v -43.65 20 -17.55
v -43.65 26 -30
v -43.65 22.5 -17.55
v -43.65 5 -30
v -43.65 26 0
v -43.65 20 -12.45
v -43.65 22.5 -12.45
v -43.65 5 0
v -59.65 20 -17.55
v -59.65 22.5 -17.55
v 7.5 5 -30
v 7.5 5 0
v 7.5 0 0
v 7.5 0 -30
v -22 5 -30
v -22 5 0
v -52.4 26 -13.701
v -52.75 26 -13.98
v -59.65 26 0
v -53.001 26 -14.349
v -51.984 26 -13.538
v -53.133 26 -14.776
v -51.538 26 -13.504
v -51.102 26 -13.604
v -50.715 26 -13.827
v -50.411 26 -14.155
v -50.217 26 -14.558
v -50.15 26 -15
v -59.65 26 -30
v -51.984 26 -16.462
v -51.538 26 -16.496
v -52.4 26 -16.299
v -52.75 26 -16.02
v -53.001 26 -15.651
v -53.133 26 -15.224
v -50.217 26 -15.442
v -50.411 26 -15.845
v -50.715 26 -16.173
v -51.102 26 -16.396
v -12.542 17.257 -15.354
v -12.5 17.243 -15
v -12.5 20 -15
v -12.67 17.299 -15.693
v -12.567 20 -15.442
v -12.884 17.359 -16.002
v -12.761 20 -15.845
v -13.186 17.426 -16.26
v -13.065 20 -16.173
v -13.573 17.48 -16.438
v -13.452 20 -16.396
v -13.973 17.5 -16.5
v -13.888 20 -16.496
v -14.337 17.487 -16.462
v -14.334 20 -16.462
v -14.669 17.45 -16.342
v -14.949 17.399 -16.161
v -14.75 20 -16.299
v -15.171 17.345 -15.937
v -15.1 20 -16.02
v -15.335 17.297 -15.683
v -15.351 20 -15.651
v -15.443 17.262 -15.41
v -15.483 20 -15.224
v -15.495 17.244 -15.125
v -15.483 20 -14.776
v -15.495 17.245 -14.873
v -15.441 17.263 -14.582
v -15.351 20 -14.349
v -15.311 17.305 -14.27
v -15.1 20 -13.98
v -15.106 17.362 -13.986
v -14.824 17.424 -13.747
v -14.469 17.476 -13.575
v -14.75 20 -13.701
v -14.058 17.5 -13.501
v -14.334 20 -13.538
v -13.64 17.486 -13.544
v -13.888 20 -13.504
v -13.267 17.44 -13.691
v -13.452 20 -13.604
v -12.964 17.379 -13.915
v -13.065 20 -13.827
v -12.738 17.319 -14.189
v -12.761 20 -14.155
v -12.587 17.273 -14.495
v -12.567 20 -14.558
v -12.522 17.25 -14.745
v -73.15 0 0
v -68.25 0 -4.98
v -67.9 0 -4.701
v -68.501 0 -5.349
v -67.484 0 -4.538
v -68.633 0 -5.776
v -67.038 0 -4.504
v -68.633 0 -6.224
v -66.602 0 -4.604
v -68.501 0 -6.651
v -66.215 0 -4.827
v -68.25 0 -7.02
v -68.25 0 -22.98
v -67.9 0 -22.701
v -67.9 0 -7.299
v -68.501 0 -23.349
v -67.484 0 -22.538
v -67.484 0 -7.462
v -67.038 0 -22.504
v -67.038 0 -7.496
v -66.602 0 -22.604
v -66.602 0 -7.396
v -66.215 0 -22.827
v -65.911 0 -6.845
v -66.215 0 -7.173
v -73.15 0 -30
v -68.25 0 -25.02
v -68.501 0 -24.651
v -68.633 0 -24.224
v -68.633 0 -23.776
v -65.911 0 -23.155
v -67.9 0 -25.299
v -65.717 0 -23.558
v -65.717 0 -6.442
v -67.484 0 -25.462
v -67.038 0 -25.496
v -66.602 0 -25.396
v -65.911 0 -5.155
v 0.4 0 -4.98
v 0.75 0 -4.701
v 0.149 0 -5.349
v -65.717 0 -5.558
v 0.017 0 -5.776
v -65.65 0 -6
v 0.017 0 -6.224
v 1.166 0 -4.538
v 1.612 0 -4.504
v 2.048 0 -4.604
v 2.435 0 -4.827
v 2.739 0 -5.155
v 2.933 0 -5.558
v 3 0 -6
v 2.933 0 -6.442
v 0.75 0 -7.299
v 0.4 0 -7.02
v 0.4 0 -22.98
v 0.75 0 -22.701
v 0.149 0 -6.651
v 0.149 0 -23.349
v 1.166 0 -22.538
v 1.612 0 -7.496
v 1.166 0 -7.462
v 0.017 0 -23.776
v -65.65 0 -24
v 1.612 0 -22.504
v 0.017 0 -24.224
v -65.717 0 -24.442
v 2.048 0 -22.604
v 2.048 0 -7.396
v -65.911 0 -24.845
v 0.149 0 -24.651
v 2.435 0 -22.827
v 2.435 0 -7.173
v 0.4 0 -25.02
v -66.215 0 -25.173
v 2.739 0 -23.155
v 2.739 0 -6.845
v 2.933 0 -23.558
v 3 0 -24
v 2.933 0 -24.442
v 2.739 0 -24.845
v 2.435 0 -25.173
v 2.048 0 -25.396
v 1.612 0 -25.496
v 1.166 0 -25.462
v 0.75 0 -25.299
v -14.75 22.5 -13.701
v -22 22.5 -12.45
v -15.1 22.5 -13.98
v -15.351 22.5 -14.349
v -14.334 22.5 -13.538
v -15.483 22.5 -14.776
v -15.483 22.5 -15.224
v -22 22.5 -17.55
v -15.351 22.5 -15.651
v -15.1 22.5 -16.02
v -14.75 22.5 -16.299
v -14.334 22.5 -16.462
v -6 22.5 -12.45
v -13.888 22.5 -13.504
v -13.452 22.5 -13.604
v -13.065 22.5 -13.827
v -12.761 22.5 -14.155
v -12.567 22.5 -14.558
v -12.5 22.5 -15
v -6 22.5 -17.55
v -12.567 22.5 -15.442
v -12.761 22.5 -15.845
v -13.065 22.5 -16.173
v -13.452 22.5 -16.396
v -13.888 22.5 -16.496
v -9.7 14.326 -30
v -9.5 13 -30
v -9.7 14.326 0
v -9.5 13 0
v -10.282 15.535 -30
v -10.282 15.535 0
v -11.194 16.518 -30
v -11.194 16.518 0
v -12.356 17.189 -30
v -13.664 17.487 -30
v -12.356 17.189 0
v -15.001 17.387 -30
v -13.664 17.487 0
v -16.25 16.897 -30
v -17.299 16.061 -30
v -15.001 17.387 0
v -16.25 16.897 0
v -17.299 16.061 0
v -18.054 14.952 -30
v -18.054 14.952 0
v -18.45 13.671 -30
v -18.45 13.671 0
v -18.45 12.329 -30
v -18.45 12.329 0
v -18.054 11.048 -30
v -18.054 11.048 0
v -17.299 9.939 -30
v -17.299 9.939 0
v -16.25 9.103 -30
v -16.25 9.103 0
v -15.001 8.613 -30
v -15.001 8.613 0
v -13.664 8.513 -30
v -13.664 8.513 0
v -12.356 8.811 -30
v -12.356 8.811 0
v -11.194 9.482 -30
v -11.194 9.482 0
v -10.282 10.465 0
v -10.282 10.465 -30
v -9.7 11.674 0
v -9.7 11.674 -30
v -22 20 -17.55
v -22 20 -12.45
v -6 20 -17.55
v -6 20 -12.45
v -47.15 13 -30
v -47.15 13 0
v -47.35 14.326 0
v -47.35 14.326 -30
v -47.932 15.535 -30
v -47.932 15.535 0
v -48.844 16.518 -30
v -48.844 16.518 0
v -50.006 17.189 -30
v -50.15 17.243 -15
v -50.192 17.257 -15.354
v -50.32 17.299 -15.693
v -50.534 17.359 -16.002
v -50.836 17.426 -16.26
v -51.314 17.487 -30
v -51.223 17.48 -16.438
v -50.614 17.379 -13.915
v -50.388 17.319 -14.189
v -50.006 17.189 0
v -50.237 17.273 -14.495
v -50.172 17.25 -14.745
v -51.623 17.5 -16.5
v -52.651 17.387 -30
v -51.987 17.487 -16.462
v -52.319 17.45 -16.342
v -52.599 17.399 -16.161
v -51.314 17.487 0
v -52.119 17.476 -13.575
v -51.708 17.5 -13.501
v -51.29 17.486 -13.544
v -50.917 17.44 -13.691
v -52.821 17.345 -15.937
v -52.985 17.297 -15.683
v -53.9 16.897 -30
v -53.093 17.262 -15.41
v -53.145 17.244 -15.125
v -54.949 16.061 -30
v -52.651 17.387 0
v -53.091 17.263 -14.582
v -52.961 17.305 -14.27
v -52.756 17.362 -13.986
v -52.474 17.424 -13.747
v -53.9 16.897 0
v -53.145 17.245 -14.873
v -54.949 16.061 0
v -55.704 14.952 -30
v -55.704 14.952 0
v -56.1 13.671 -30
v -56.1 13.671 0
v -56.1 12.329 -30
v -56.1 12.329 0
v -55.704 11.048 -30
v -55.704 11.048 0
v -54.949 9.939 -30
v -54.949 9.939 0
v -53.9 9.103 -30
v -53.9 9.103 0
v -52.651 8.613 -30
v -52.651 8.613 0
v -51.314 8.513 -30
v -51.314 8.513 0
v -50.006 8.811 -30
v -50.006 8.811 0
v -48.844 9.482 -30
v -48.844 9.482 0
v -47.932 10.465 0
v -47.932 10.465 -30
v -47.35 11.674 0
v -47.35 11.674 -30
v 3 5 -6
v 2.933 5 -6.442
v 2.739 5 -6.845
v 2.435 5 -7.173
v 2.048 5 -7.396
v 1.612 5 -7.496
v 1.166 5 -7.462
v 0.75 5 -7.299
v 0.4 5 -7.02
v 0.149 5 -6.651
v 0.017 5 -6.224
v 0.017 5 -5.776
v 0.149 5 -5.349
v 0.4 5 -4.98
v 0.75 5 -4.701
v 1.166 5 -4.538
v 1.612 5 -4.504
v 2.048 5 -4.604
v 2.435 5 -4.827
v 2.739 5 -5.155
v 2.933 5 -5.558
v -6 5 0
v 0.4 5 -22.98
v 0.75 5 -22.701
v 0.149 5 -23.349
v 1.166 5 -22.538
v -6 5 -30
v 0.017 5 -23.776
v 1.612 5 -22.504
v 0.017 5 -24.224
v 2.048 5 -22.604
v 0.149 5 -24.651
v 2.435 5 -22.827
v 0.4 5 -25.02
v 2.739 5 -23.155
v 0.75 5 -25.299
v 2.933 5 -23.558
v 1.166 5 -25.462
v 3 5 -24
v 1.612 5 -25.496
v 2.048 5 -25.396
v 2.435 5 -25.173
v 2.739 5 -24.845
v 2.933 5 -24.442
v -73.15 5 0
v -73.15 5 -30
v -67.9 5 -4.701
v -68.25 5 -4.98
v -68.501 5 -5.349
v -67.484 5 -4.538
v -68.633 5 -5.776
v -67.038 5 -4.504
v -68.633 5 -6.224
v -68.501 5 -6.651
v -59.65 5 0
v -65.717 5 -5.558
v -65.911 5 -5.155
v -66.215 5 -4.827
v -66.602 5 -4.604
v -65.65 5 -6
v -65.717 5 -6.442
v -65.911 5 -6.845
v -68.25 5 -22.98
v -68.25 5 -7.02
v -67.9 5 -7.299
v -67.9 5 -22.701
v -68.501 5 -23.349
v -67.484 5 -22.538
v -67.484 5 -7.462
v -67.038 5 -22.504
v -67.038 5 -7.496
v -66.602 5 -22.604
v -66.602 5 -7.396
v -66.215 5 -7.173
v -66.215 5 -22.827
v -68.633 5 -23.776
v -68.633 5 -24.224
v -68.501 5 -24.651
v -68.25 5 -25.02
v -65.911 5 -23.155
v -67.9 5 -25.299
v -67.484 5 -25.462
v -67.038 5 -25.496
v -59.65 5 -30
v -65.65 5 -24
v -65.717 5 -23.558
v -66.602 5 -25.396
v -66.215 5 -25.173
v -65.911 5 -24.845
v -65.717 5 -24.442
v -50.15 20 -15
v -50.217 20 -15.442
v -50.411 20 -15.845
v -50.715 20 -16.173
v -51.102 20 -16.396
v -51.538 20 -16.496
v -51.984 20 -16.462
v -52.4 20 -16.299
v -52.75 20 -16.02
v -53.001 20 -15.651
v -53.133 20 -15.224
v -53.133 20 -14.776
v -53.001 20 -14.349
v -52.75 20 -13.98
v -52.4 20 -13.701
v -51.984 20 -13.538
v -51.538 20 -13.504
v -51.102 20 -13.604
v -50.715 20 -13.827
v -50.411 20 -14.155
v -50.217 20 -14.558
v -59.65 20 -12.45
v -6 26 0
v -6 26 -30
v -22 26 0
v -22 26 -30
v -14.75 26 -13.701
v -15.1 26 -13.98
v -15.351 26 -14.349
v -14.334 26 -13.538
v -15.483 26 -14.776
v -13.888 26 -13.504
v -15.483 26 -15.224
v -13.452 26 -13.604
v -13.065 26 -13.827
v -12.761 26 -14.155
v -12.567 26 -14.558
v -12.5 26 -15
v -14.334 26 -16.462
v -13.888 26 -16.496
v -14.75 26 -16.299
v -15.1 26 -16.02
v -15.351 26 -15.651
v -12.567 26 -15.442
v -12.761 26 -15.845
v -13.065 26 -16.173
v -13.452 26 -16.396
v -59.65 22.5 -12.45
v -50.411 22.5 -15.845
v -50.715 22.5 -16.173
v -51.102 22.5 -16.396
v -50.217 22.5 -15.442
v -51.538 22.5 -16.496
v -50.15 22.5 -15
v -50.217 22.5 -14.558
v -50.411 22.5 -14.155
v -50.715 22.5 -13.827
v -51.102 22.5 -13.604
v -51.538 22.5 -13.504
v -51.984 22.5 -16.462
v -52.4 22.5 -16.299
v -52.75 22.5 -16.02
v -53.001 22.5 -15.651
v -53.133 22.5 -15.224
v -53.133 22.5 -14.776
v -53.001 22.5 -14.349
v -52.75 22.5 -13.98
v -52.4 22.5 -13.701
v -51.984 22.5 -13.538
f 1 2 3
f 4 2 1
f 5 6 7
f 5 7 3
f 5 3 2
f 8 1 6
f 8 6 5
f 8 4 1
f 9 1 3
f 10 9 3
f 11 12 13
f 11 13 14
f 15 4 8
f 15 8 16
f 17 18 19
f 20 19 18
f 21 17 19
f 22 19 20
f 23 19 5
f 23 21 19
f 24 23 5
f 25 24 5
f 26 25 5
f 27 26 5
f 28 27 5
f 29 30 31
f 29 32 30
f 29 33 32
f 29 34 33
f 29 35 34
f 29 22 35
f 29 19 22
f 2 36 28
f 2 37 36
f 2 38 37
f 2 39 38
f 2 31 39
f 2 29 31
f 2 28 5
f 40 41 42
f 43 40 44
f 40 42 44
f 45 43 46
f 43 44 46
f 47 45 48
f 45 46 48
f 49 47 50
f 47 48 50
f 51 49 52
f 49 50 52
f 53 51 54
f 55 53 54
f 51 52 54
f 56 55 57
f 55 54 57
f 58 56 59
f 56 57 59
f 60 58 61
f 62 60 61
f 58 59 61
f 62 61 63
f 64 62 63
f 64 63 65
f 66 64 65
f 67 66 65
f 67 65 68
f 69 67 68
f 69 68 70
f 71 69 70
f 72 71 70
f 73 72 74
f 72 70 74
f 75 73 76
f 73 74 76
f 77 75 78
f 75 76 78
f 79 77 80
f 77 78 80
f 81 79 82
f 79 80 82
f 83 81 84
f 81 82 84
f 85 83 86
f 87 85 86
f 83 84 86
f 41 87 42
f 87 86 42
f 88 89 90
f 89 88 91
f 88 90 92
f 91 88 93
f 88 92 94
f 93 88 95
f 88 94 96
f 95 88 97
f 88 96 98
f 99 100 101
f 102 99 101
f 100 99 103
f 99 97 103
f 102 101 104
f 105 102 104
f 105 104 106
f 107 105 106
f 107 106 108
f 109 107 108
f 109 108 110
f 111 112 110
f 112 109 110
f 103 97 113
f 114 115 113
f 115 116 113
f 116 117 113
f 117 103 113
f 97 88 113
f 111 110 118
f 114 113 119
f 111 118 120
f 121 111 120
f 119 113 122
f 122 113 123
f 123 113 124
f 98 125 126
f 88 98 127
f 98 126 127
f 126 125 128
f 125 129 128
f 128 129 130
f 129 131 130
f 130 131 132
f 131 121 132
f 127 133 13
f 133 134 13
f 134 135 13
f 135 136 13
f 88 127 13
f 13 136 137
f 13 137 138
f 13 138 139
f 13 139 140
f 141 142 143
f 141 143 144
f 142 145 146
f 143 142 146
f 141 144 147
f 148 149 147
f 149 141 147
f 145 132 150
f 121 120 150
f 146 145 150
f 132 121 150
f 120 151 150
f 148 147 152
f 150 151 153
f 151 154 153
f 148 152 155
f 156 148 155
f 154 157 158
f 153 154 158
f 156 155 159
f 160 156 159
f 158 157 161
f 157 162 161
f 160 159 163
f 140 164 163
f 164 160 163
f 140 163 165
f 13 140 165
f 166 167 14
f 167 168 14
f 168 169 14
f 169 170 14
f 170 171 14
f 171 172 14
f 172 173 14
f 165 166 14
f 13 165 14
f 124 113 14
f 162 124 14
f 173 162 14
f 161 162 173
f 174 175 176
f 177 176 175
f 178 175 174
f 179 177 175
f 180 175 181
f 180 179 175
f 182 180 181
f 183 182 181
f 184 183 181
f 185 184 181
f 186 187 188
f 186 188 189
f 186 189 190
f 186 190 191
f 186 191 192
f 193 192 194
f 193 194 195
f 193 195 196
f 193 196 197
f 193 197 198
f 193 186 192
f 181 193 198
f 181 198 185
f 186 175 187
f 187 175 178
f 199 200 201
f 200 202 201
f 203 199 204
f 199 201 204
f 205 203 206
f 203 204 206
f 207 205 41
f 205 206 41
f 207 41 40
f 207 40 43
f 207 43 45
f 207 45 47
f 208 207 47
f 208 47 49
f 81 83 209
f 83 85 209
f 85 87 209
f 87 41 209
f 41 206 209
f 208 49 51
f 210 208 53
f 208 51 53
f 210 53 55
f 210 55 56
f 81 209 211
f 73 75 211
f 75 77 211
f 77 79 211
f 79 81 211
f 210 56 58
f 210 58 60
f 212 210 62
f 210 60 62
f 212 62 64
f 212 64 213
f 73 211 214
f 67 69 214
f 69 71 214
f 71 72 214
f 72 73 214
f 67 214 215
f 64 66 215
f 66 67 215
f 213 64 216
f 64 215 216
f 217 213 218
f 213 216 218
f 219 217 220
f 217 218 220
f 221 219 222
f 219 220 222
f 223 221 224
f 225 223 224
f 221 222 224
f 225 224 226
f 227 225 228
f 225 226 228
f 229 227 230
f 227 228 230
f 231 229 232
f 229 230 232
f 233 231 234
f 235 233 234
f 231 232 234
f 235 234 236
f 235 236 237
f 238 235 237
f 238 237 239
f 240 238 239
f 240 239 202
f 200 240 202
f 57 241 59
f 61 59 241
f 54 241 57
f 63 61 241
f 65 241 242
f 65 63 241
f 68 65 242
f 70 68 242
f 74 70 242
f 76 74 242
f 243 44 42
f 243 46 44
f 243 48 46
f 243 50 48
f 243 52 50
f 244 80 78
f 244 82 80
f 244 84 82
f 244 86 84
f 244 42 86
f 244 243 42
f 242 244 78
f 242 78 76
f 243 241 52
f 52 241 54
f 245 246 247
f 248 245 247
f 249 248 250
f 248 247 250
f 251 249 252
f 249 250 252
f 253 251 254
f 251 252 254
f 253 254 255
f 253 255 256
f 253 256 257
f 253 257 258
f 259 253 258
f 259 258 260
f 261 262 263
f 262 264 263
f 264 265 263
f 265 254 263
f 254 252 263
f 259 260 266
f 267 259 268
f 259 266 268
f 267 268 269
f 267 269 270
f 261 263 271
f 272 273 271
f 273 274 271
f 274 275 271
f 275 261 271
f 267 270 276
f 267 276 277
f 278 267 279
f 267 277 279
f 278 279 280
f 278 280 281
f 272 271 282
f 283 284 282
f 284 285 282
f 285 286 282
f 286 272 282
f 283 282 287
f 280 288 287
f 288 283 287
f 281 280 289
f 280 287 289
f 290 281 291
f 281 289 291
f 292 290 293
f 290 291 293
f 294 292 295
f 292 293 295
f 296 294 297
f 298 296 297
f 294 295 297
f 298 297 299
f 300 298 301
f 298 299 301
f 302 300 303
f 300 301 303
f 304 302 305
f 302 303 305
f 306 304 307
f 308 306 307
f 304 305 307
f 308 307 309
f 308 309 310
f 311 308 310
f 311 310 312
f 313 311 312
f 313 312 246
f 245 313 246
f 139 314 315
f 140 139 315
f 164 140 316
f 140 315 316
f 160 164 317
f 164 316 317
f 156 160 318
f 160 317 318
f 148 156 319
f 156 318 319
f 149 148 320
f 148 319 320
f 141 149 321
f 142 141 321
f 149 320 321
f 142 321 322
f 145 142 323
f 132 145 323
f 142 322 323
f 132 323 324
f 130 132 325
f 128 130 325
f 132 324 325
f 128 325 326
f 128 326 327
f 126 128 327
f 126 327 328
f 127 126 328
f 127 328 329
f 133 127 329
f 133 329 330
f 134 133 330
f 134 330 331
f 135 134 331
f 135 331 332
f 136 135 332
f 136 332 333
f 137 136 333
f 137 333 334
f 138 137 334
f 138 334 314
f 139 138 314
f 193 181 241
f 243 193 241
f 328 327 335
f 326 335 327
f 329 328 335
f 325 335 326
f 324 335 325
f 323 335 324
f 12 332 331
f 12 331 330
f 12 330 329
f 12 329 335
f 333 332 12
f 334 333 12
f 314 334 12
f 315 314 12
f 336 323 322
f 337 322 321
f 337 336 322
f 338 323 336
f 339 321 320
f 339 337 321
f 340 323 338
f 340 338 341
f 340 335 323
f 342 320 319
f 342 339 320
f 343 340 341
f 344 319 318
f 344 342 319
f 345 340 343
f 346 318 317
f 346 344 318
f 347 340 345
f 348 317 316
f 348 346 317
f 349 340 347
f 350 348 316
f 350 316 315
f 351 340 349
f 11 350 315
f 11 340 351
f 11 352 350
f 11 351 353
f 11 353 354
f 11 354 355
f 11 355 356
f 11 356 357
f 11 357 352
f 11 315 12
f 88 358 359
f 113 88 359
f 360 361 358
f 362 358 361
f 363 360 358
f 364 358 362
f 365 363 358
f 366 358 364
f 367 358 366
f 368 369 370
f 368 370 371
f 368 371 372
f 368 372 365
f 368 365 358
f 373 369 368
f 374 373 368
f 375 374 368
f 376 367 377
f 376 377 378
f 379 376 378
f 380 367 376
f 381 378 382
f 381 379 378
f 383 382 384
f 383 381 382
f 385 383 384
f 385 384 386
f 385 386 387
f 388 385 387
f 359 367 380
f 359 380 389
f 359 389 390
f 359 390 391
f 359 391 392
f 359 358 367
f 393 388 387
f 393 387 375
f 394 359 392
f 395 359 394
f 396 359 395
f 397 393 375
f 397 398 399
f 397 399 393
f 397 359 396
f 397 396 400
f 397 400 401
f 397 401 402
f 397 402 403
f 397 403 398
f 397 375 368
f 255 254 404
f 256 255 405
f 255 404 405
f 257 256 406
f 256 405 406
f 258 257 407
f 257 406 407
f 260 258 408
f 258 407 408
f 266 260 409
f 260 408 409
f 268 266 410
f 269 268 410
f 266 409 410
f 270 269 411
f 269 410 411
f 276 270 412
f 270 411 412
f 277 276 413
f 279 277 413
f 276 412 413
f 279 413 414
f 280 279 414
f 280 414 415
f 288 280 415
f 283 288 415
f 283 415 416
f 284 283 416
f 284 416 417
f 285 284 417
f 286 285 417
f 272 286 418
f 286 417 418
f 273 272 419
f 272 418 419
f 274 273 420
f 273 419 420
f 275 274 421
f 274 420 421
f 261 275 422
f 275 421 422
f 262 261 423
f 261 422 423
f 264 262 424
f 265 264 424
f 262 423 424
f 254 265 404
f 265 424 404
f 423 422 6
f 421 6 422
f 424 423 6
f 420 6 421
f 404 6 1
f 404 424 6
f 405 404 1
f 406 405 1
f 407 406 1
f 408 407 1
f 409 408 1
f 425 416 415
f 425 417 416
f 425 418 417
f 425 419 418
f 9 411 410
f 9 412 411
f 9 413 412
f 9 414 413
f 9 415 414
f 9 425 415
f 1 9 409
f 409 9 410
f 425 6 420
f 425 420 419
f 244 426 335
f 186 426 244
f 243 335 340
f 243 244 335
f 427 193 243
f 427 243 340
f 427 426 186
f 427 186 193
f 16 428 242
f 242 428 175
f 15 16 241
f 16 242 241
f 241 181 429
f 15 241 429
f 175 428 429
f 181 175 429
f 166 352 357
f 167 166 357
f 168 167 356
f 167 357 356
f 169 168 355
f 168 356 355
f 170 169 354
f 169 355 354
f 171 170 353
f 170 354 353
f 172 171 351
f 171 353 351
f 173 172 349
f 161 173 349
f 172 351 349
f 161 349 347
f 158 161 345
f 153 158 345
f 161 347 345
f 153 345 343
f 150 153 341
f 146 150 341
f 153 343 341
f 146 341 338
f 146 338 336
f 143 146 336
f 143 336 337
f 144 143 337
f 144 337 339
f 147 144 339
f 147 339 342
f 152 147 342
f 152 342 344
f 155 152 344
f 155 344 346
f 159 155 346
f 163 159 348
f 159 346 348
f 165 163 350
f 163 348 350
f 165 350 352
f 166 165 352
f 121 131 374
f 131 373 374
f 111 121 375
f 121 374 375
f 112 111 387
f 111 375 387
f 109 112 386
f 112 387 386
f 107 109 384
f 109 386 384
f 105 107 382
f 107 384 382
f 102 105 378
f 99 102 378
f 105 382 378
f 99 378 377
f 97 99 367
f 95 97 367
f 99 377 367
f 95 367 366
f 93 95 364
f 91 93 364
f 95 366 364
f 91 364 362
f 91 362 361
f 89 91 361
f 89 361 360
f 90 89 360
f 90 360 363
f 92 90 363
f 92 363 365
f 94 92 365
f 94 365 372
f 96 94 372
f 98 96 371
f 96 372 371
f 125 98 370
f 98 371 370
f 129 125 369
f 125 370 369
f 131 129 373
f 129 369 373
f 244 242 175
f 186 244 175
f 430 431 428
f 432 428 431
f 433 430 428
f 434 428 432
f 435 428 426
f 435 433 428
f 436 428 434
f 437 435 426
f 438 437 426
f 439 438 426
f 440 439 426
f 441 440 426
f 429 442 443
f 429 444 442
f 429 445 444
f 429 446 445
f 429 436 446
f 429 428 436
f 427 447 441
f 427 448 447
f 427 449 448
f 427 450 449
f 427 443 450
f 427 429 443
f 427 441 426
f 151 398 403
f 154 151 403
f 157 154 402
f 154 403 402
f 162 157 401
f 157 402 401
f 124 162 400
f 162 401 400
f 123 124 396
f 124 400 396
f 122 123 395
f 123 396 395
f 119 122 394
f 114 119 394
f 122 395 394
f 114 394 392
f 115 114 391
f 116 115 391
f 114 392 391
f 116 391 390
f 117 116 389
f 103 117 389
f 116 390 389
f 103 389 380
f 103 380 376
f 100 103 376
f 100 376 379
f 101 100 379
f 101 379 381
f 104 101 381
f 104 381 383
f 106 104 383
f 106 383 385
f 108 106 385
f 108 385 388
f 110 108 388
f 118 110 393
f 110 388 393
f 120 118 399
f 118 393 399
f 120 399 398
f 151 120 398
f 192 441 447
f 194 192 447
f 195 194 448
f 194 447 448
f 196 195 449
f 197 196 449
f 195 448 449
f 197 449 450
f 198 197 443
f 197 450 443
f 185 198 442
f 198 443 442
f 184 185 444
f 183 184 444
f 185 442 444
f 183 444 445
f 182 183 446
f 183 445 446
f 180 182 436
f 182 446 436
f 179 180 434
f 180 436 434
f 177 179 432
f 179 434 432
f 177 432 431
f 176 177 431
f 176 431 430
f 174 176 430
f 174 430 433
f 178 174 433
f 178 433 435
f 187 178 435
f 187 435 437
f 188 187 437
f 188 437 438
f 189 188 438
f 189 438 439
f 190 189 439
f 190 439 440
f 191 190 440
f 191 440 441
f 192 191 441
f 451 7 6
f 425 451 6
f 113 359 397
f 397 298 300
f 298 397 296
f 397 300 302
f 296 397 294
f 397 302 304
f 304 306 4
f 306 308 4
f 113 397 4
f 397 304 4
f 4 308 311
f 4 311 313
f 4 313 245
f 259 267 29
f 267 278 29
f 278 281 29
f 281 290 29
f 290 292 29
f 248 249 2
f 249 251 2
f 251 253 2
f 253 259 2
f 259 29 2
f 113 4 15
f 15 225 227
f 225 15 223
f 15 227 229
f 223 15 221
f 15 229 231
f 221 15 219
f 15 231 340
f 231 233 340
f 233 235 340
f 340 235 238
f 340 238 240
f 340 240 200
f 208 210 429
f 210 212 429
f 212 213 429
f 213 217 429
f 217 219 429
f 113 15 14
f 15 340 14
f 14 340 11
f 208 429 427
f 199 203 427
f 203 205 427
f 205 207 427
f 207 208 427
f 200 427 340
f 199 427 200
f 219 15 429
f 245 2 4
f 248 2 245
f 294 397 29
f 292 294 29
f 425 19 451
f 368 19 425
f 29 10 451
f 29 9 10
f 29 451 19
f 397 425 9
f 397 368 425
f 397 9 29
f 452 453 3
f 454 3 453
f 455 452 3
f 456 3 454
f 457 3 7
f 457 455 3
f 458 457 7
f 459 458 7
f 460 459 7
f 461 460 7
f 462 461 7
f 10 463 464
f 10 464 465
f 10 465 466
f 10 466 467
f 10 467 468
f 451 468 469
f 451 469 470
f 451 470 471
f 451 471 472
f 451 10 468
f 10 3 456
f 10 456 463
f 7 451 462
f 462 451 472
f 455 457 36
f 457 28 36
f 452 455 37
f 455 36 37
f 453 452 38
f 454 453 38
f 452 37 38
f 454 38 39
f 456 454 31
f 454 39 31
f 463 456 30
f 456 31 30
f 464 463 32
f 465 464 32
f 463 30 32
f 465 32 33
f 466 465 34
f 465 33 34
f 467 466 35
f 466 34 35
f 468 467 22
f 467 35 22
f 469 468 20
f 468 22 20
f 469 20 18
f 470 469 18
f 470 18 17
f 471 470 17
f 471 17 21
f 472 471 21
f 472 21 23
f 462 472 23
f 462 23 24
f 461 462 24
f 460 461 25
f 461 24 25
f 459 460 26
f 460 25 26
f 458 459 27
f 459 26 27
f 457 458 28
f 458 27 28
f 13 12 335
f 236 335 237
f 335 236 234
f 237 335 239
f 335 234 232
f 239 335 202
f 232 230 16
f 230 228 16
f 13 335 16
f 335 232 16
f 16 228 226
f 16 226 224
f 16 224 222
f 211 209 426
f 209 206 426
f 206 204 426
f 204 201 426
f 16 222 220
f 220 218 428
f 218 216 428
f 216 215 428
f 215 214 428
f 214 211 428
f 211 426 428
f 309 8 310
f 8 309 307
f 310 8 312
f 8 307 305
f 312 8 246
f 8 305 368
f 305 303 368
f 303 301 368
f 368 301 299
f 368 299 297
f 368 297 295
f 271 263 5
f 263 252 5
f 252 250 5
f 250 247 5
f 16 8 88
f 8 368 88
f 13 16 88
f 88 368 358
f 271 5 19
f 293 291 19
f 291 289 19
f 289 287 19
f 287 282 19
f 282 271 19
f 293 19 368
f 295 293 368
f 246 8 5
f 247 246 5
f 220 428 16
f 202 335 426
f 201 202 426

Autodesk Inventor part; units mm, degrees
ref_plane "YZ Plane" through (0, 0, 0) normal (1, 0, 0) x (0, 1, 0)
ref_plane "XZ Plane" through (0, 0, 0) normal (0, 1, 0) x (-1, 0, 0)
ref_plane "XY Plane" through (0, 0, 0) normal (0, 0, 1) x (1, 0, 0)
sketch "Skizze1" plane through (0, 0, 0) normal (0, 1, 0) x (-1, 0, 0)
  line L0 (0, 0) -> (65.65, 0)
  line L1 (65.65, 0) -> (65.65, -80)
  line L2 (65.65, -80) -> (0, -80)
  line L3 (0, -80) -> (0, 0)
  dimension "d0" = 65.65
  dimension "d1" = 80
extrude "Extrusion1" add sketch "Skizze1" along normal blind 5
sketch "Skizze2" plane through (0, 5, 0) normal (0, 1, 0) x (1, 0, 0)
  line L0 (-65.65, 80) -> (-65.65, 0) projected
  line L1 (-65.65, 0) -> (0, 0) projected
  line L2 (-65.65, 0) -> (-59.65, 0) construction
  line L3 (-59.65, 0) -> (-59.65, 30)
  line L4 (-59.65, 30) -> (-43.65, 30)
  line L5 (-43.65, 30) -> (-43.65, 0)
  line L6 (-43.65, 0) -> (-59.65, 0)
  line L7 (-22, 0) -> (-22, 30)
  line L8 (-22, 30) -> (-6, 30)
  line L9 (-6, 30) -> (-6, 0)
  line L10 (-6, 0) -> (-22, 0)
  dimension "d4" = 6
  dimension "d6" = 30
  dimension "d7" = 16
  dimension "d8" = 90
  dimension "d9" = 16
  dimension "d10" = 21.65
  dimension "d11" = 30
  dimension "d12" = 16
  dimension "d13" = 90
  dimension "d14" = 30
  dimension "d15" = 90
extrude "Extrusion2" add sketch "Skizze2" along normal blind 21 contours L3 L4 L5 L1
sketch "Skizze3" plane through (0, 5, 0) normal (0, 1, 0) x (1, 0, 0)
  line L0 (-43.65, 0) -> (0, 0) projected
  line L1 (-43.65, 0) -> (-22, 0)
  line L2 (-22, 0) -> (-22, 30)
  line L3 (-22, 30) -> (-6, 30)
  line L4 (-6, 30) -> (-6, 0)
  line L5 (-6, 0) -> (-22, 0)
  dimension "d18" = 21.65
  dimension "d19" = 30
  dimension "d21" = 16
  dimension "d22" = 16
extrude "Extrusion3" add sketch "Skizze3" along normal blind 21
sketch "Skizze4" plane through (0, 5, 0) normal (0, 1, 0) x (1, 0, 0)
  line L0 (-65.65, 0) -> (0, 0) projected
  line L1 (-5.9719, 0) -> (14.5281, 0)
  line L2 (14.5281, 0) -> (14.5281, 80)
  line L3 (0, 0) -> (0, 80) projected
  line L4 (14.5281, 80) -> (0, 80)
  line L5 (0, 80) -> (0, 0)
  dimension "d25" = 20.5
  dimension "d26" = 80
  dimension "d27" = 90
extrude "Extrusion4" add sketch "Skizze4" against normal blind 5
sketch "Skizze5" plane through (0, 5, 0) normal (0, 1, 0) x (1, 0, 0)
  line L0 (-22, 30) -> (-6, 30) projected
  line L1 (-22, 30) -> (-14, 30)
  line L2 (-14, 30) -> (-14, 38)
  line L3 (-14, 38) -> (-29.5, 38)
  circle A0 centre (-29.5, 38) radius 1
  point P0 (0, 0)
  dimension "d30" = 8
  dimension "d31" = 8
  dimension "d32" = 15.5
  dimension "d33" = 2
extrude "Extrusion5" cut sketch "Skizze5" against normal blind 5
sketch "Skizze6" plane through (0, 5, 0) normal (0, 1, 0) x (1, 0, 0)
  circle A0 centre (-29.5, 38) radius 1 projected
  line L0 (-29.5, 38) -> (1.5, 38)
  line L1 (-29.5, 38) -> (1.5, 38) construction
  circle A1 centre (1.5, 38) radius 1
  point P0 (0, 0)
  dimension "d36" = 31
  dimension "d37" = 0
  dimension "d38" = 2
extrude "Extrusion6" cut sketch "Skizze6" against normal blind 5 contours A1
sketch "Skizze7" plane through (0, 5, 0) normal (0, 1, 0) x (1, 0, 0)
  circle A0 centre (1.5, 38) radius 1 projected
  line L0 (1.5, 38) -> (1.5, 69)
  circle A1 centre (1.5, 69) radius 1
  point P0 (0, 0)
  dimension "d41" = 31
  dimension "d42" = 2
extrude "Extrusion7" cut sketch "Skizze7" against normal blind 5 contours A1
sketch "Skizze8" plane through (0, 5, 0) normal (0, 1, 0) x (1, 0, 0)
  circle A0 centre (-29.5, 38) radius 1 projected
  line L0 (-29.5, 38) -> (-29.5, 69)
  circle A1 centre (-29.5, 69) radius 1
  point P0 (0, 0)
  dimension "d45" = 31
  dimension "d46" = 2
extrude "Extrusion8" cut sketch "Skizze8" against normal blind 5 contours A1
sketch "Skizze9" plane through (0, 5, 0) normal (0, 1, 0) x (1, 0, 0)
  circle A0 centre (1.5, 38) radius 1 projected
  line L0 (1.5, 38) -> (7.5, 38)
  line L1 (14.5281, 80) -> (-65.65, 80) projected
  line L2 (-65.65, 0) -> (14.5281, 0) projected
  line L3 (14.5281, 0) -> (14.5281, 80) projected
  line L4 (7.5, 38) -> (14.5281, 38)
  line L5 (14.5281, 38) -> (14.5281, 80)
  line L6 (14.5281, 80) -> (7.5, 80)
  line L7 (7.5, 80) -> (7.5, 38)
  point P0 (0, 0)
  dimension "d49" = 6
extrude "Extrusion9" cut sketch "Skizze9" against normal blind 5 contours L7 L1 L3 L4
sketch "Skizze10" plane through (0, 5, 0) normal (0, 1, 0) x (1, 0, 0)
  line L0 (7.5, 38) -> (7.5, 80) projected
  line L1 (14.5281, 0) -> (14.5281, 38) projected
  line L2 (7.5, 38) -> (14.5281, 38)
  line L3 (14.5281, 38) -> (14.5281, 0)
  line L4 (14.5281, 0) -> (7.5, 0)
  line L5 (7.5, 0) -> (7.5, 38)
  point P0 (0, 0)
extrude "Extrusion10" cut sketch "Skizze10" against normal blind 5
sketch "Skizze11" plane through (0, 5, 0) normal (0, 1, 0) x (1, 0, 0)
  circle A0 centre (1.5, 69) radius 1 projected
  line L0 (1.5, 69) -> (1.5, 75)
  line L1 (1.5, 75) -> (7.5, 75)
  line L2 (7.5, 0) -> (7.5, 80) projected
  line L3 (7.5, 80) -> (1.5, 80)
  line L4 (7.5, 80) -> (-65.65, 80) projected
  line L5 (1.5, 75) -> (1.5, 80)
  point P0 (0, 0)
  dimension "d54" = 6
extrude "Extrusion11" cut sketch "Skizze11" against normal blind 5 contours L5 L3 L2 L1
sketch "Skizze12" plane through (0, 5, 0) normal (0, 1, 0) x (1, 0, 0)
  line L0 (1.5, 80) -> (-65.65, 80) projected
  line L1 (1.5, 75) -> (-65.65, 75)
  line L2 (-65.65, 75) -> (-65.65, 80)
  line L3 (-65.65, 80) -> (1.5, 80)
  line L4 (1.5, 80) -> (1.5, 75)
  point P0 (0, 0)
extrude "Extrusion12" cut sketch "Skizze12" against normal blind 5
sketch "Skizze13" plane through (0, 5, 0) normal (0, 1, 0) x (1, 0, 0)
  circle A0 centre (1.5, 38) radius 1 projected
  line L0 (1.5, 38) -> (1.5, 23)
  circle A1 centre (1.5, 23) radius 1
  point P0 (0, 0)
  dimension "d59" = 15
  dimension "d60" = 2
extrude "Extrusion13" cut sketch "Skizze13" against normal blind 5 contours A1
sketch "Skizze14" plane through (0, 5, 0) normal (0, 1, 0) x (1, 0, 0)
  circle A0 centre (1.5, 23) radius 1 projected
  line L0 (-65.65, 0) -> (7.5, 0) projected
  line L1 (-6, 30) -> (-6, 0) projected
  line L2 (1.5, 0) -> (-6, 0)
  line L3 (1.5, 0) -> (1.5, 6)
  circle A1 centre (1.5, 6) radius 1
  point P0 (0, 0)
  dimension "d63" = 6
  dimension "d64" = 2
extrude "Extrusion14" cut sketch "Skizze14" against normal blind 5 contours A1
sketch "Skizze15" plane through (0, 5, 0) normal (0, 1, 0) x (1, 0, 0)
  line L0 (-65.65, 0) -> (7.5, 0) projected
  line L1 (-65.65, 0) -> (-62.65, 0)
  line L2 (-62.65, 0) -> (-62.65, 6)
  circle A0 centre (-62.65, 6) radius 1
  point P0 (0, 0)
  dimension "d67" = 3
  dimension "d68" = 6
  dimension "d69" = 2
extrude "Extrusion15" cut sketch "Skizze15" against normal blind 5
sketch "Skizze16" plane through (0, 5, 0) normal (0, 1, 0) x (1, 0, 0)
  circle A0 centre (-62.65, 6) radius 1 projected
  line L0 (-62.65, 6) -> (-62.65, 23)
  circle A1 centre (-62.65, 23) radius 1
  point P0 (0, 0)
  dimension "d72" = 17
  dimension "d73" = 2
extrude "Extrusion16" cut sketch "Skizze16" against normal blind 5 contours A1
sketch "Skizze17" plane through (-65.65, 0, 0) normal (0, 0, 1) x (1, 0, 0)
  line L0 (6, 26) -> (22, 26) projected
  line L1 (6, 26) -> (14, 26)
  line L2 (14, 26) -> (14, 13)
  circle A0 centre (14, 13) radius 4.5
  point P0 (65.65, 0)
  dimension "d76" = 8
  dimension "d77" = 13
  dimension "d78" = 9
extrude "Extrusion17" cut sketch "Skizze17" against normal blind 30
sketch "Skizze18" plane through (-65.65, 0, 0) normal (0, 0, 1) x (1, 0, 0)
  line L0 (43.65, 5) -> (43.65, 26) projected
  line L1 (43.65, 26) -> (51.65, 26)
  line L2 (51.65, 26) -> (51.65, 13)
  circle A0 centre (51.65, 13) radius 4.5
  point P0 (65.65, 0)
  dimension "d81" = 8
  dimension "d82" = 13
  dimension "d83" = 9
extrude "Extrusion18" cut sketch "Skizze18" against normal blind 30
sketch "Skizze19" plane through (-59.65, 5, -30) normal (-1, 0, 0) x (0, 0, 1)
  line L0 (0, 0) -> (0, 21) projected
  line L1 (0, 21) -> (15, 21)
  line L2 (0, 21) -> (30, 21) projected
  line L3 (15, 21) -> (15, 17)
  line L4 (15, 17) -> (17.75, 17)
  line L5 (17.75, 17) -> (12.25, 17)
  line L6 (12.25, 17) -> (12.25, 15.75)
  line L7 (12.25, 15.75) -> (17.75, 15.75)
  line L8 (17.75, 15.75) -> (17.75, 17)
  point P0 (30, -5)
  dimension "d86" = 15
  dimension "d87" = 4
  dimension "d88" = 2.75
  dimension "d89" = 5.5
  dimension "d90" = 1.25
extrude "Extrusion19" cut sketch "Skizze19" against normal blind 16
sketch "Skizze20" plane through (0, 5, 0) normal (0, 1, 0) x (1, 0, 0)
  circle A0 centre (1.5, 23) radius 1 projected
  circle A1 centre (1.5, 23) radius 1.5
  point P0 (0, 0)
  dimension "d93" = 3
extrude "Extrusion20" cut sketch "Skizze20" against normal blind 5 contours A0 | A1
sketch "Skizze21" plane through (0, 5, 0) normal (0, 1, 0) x (1, 0, 0)
  circle A0 centre (1.5, 6) radius 1 projected
  circle A1 centre (1.5, 6) radius 1.5
  point P0 (0, 0)
  dimension "d96" = 3
extrude "Extrusion21" cut sketch "Skizze21" against normal blind 5 contours A0 | A1
sketch "Skizze22" plane through (0, 5, 0) normal (0, 1, 0) x (1, 0, 0)
  circle A0 centre (-62.65, 23) radius 1 projected
  circle A1 centre (-62.65, 23) radius 1.5
  point P0 (0, 0)
  dimension "d99" = 3
extrude "Extrusion22" cut sketch "Skizze22" against normal blind 5 contours A0 | A1
sketch "Skizze23" plane through (0, 5, 0) normal (0, 1, 0) x (1, 0, 0)
  circle A0 centre (-62.65, 6) radius 1 projected
  circle A1 centre (-62.65, 6) radius 1.5
  point P0 (0, 0)
  dimension "d102" = 3
extrude "Extrusion23" cut sketch "Skizze23" against normal blind 5 contours A0 | A1
sketch "Skizze24" plane through (0, 5, 0) normal (0, 1, 0) x (1, 0, 0)
  circle A0 centre (1.5, 69) radius 1 projected
  circle A1 centre (1.5, 69) radius 2.25
  point P0 (0, 0)
  dimension "d105" = 4.5
extrude "Extrusion24" cut sketch "Skizze24" against normal blind 5 contours A0 | A1
sketch "Skizze25" plane through (0, 5, 0) normal (0, 1, 0) x (1, 0, 0)
  circle A0 centre (-29.5, 69) radius 1 projected
  circle A1 centre (-29.5, 69) radius 2.25
  point P0 (0, 0)
  dimension "d108" = 4.5
extrude "Extrusion25" cut sketch "Skizze25" against normal blind 5 contours A0 | A1
sketch "Skizze26" plane through (0, 5, 0) normal (0, 1, 0) x (1, 0, 0)
  circle A0 centre (1.5, 38) radius 1 projected
  circle A1 centre (1.5, 38) radius 2.25
  point P0 (0, 0)
  dimension "d112" = 4.5
extrude "Extrusion26" cut sketch "Skizze26" against normal blind 5 contours A0 | A1
sketch "Skizze27" plane through (0, 5, 0) normal (0, 1, 0) x (1, 0, 0)
  circle A0 centre (-29.5, 38) radius 1 projected
  circle A1 centre (-29.5, 38) radius 2.25
  point P0 (0, 0)
  dimension "d115" = 4.5
extrude "Extrusion27" cut sketch "Skizze27" against normal blind 5 contours A0 | A1
sketch "Skizze28" plane through (0, 26, 0) normal (0, 1, 0) x (1, 0, 0)
  line L0 (-43.65, 30) -> (-43.65, 0) projected
  line L1 (-59.65, 0) -> (-59.65, 30) projected
  line L2 (-43.65, 0) -> (-59.65, 30)
  line L3 (-59.65, 30) -> (-43.65, 30) projected
  line L4 (-43.65, 30) -> (-59.65, 0)
  circle A0 centre (-51.65, 15) radius 1.5
  point P0 (0, 0)
  dimension "d118" = 3
extrude "Extrusion28" cut sketch "Skizze28" against normal blind 13 contours A0 L2 L4 | L4 L2 A0 | A0 L4 L2 | L2 L4 A0
sketch "Skizze29" plane through (-6, 5, 0) normal (1, 0, 0) x (0, 0, -1)
  line L0 (0, 21) -> (15, 21)
  line L1 (0, 21) -> (30, 21) projected
  line L2 (15, 21) -> (11, 21)
  line L3 (15, 21) -> (15, 17)
  line L4 (15, 21) -> (19, 21) construction
  line L5 (15, 17) -> (17.27, 17)
  line L6 (12.25, 17) -> (17.75, 17) projected
  line L7 (17.27, 17) -> (11.77, 17)
  line L8 (11.77, 17) -> (11.77, 15.75)
  line L9 (11.77, 15.75) -> (17.27, 15.75)
  line L10 (17.27, 15.75) -> (17.27, 17)
  point P0 (0, -5)
  dimension "d123" = 15
  dimension "d124" = 4
  dimension "d125" = 4
  dimension "d126" = 90
  dimension "d127" = 2.27
  dimension "d128" = 5.5
  dimension "d129" = 1.25
extrude "Extrusion29" cut sketch "Skizze29" against normal blind 16
sketch "Skizze30" plane through (0, 26, 0) normal (0, 1, 0) x (1, 0, 0)
  line L0 (-22, 30) -> (-22, 0) projected
  line L1 (-6, 0) -> (-6, 30) projected
  line L2 (-22, 0) -> (-6, 30)
  line L3 (-22, 30) -> (-6, 0)
  circle A0 centre (-14, 15) radius 1.5
  point P0 (0, 0)
  dimension "d132" = 3
extrude "Extrusion30" cut sketch "Skizze30" against normal blind 13 contours A0 L2 L3 | L3 L2 A0 | L2 L3 A0 | L2 A0 L3
sketch "Skizze31" plane through (0, 5, 0) normal (0, 1, 0) x (1, 0, 0)
  circle A0 centre (-29.5, 38) radius 2.25 projected
  circle A1 centre (1.5, 69) radius 2.25 projected
  line L0 (-29.5, 38) -> (1.5, 69)
  circle A2 centre (-29.5, 69) radius 2.25 projected
  circle A3 centre (1.5, 38) radius 2.25 projected
  line L1 (-29.5, 69) -> (1.5, 38)
  circle A4 centre (-14, 53.5) radius 11.5
  point P0 (0, 0)
  dimension "d137" = 23
extrude "Extrusion31" cut sketch "Skizze31" against normal blind 5 contours A4 L1 L0 | L0 L1 A4 | L1 A4 L0 | L0 A4 L1
sketch "Skizze32" plane through (0, 5, 0) normal (0, 1, 0) x (1, 0, 0)
  circle A0 centre (-29.5, 38) radius 2.25 projected
  circle A1 centre (-29.5, 38) radius 2.25
  point P0 (0, 0)
  dimension "d140" = 4.5
extrude "Extrusion32" add sketch "Skizze32" against normal blind 5
sketch "Skizze33" plane through (0, 5, 0) normal (0, 1, 0) x (1, 0, 0)
  circle A0 centre (-29.5, 69) radius 2.25 projected
  circle A1 centre (-29.5, 69) radius 2.25
  point P0 (0, 0)
  dimension "d143" = 4.5
extrude "Extrusion33" add sketch "Skizze33" against normal blind 5
sketch "Skizze34" plane through (0, 5, 0) normal (0, 1, 0) x (1, 0, 0)
  circle A0 centre (1.5, 38) radius 2.25 projected
  circle A1 centre (1.5, 38) radius 2.25
  point P0 (0, 0)
  dimension "d146" = 4.5
extrude "Extrusion34" add sketch "Skizze34" against normal blind 5
sketch "Skizze35" plane through (0, 5, 0) normal (0, 1, 0) x (1, 0, 0)
  circle A0 centre (-14, 53.5) radius 11.5 projected
  circle A1 centre (-14, 53.5) radius 11.5
  point P0 (0, 0)
  dimension "d149" = 23
extrude "Extrusion35" add sketch "Skizze35" against normal blind 5
sketch "Skizze36" plane through (0, 5, 0) normal (0, 1, 0) x (1, 0, 0)
  point P0 (0, 0)
sketch "Skizze37" plane through (0, 5, 0) normal (0, 1, 0) x (1, 0, 0)
  circle A0 centre (1.5, 69) radius 2.25 projected
  circle A1 centre (1.5, 69) radius 2.25
  point P0 (0, 0)
  dimension "d152" = 4.5
extrude "Extrusion36" add sketch "Skizze37" against normal blind 5
sketch "Skizze38" plane through (0, 5, 0) normal (0, 1, 0) x (1, 0, 0)
  circle A0 centre (1.5, 6) radius 1.5 projected
  circle A1 centre (1.5, 6) radius 1.5
  point P0 (0, 0)
  dimension "d155" = 3
extrude "Extrusion37" add sketch "Skizze38" against normal blind 5
sketch "Skizze39" plane through (0, 5, 0) normal (0, 1, 0) x (1, 0, 0)
  circle A0 centre (1.5, 23) radius 1.5 projected
  circle A1 centre (1.5, 23) radius 1.5
  point P0 (0, 0)
  dimension "d158" = 3
extrude "Extrusion38" add sketch "Skizze39" against normal blind 5
sketch "Skizze40" plane through (0, 5, 0) normal (0, 1, 0) x (1, 0, 0)
  line L0 (7.5, 75) -> (7.5, 0) projected
  line L1 (0, 0) -> (7.5, 0)
  line L2 (7.5, 0) -> (7.5, 75)
  line L3 (7.5, 75) -> (0, 75)
  line L4 (0, 75) -> (0, 0)
extrude "Extrusion39" cut sketch "Skizze40" against normal blind 5
sketch "Skizze41" plane through (0, 5, 0) normal (0, 1, 0) x (1, 0, 0)
  line L0 (0, 0) -> (0, 75) projected
  line L1 (0, 0) -> (-3, 0)
  line L2 (-6, 0) -> (0, 0) projected
  line L3 (-3, 0) -> (-9, 0)
  line L4 (-3, 0) -> (-3, 6)
  line L5 (-3, 0) -> (3, 0) construction
  circle A0 centre (-3, 6) radius 1.5
  dimension "d163" = 3
  dimension "d164" = 6
  dimension "d165" = 6
  dimension "d166" = 90
  dimension "d167" = 3
extrude "Extrusion40" cut sketch "Skizze41" against normal blind 5
sketch "Skizze42" plane through (0, 5, 0) normal (0, 1, 0) x (1, 0, 0)
  circle A0 centre (-3, 6) radius 1.5 projected
  line L0 (-3, 6) -> (-3, 23)
  line L1 (-3, 6) -> (14, 6) construction
  circle A1 centre (-3, 23) radius 1.5
  point P0 (0, 0)
  dimension "d170" = 17
  dimension "d171" = 90
  dimension "d172" = 3
extrude "Extrusion41" cut sketch "Skizze42" against normal blind 5 contours A1
sketch "Skizze43" plane through (0, 5, 0) normal (0, 1, 0) x (1, 0, 0)
  line L0 (-59.65, 30) -> (-43.65, 30) projected
  line L1 (-65.65, 75) -> (0, 75) projected
  line L2 (-59.65, 30) -> (0, 30)
  line L3 (0, 30) -> (0, 75)
  line L4 (0, 75) -> (-59.65, 75)
  line L5 (-59.65, 75) -> (-59.65, 30)
  point P0 (0, 0)
extrude "Extrusion42" cut sketch "Skizze43" against normal blind 5
sketch "Skizze44" plane through (0, 5, 0) normal (0, 1, 0) x (1, 0, 0)
  line L0 (-59.65, 0) -> (-59.65, 30) projected
  line L1 (-65.65, 75) -> (-59.65, 75) projected
  line L2 (-59.65, 30) -> (-65.65, 30)
  line L3 (-65.65, 30) -> (-65.65, 75)
  line L4 (-65.65, 75) -> (-59.65, 75)
  line L5 (-59.65, 75) -> (-59.65, 30)
  point P0 (0, 0)
extrude "Extrusion43" cut sketch "Skizze44" against normal blind 5
sketch "Skizze45" plane through (0, 5, 0) normal (0, 1, 0) x (1, 0, 0)
  point P0 (0, 0)
sketch "Skizze46" plane through (0, 5, 0) normal (0, 1, 0) x (1, 0, 0)
  line L0 (-65.65, 0) -> (0, 0) projected
  line L1 (-65.65, 0) -> (0, 0)
  line L2 (0, 0) -> (0, -15)
  line L3 (0, -15) -> (-65.65, -15)
  line L4 (-65.65, -15) -> (-65.65, 0)
  dimension "d179" = 15
extrude "Extrusion44" add sketch "Skizze46" against normal blind 5
sketch "Skizze47" plane through (0, 5, 0) normal (0, 1, 0) x (1, 0, 0)
  line L0 (-22, 0) -> (-22, 30) projected
  line L1 (-22, 0) -> (-28, 0)
  line L2 (-65.65, -15) -> (0, -15) projected
  line L3 (-28, 0) -> (-65.65, 0)
  line L4 (-65.65, 0) -> (-65.65, -15)
  line L5 (-65.65, -15) -> (-28, -15)
  line L6 (-28, -15) -> (-28, 0)
  point P0 (0, 0)
  dimension "d182" = 6
extrude "Extrusion45" cut sketch "Skizze47" against normal blind 5
sketch "Skizze48" plane through (-22, 5, 0) normal (0, 0, 1) x (1, 0, 0)
  point P0 (22, -5)
sketch "Skizze49" plane through (0, 5, 0) normal (0, 1, 0) x (1, 0, 0)
  line L0 (-22, 0) -> (-6, 0) projected
  line L1 (0, 30) -> (0, -15) projected
  line L2 (-6, 0) -> (0, 0)
  line L3 (0, 0) -> (0, -15)
  line L4 (0, -15) -> (-6, -15)
  line L5 (-6, -15) -> (-6, 0)
extrude "Extrusion46" cut sketch "Skizze49" against normal blind 5
sketch "Skizze50" plane through (0, 5, 0) normal (0, 1, 0) x (1, 0, 0)
  line L0 (-22, 0) -> (-6, 0) projected
  line L1 (-28, 0) -> (-28, -15) projected
  line L2 (-22, 0) -> (-28, 0)
  line L3 (-28, 0) -> (-28, -15)
  line L4 (-28, -15) -> (-22, -15)
  line L5 (-22, -15) -> (-22, 0)
  point P0 (0, 0)
extrude "Extrusion47" cut sketch "Skizze50" against normal blind 5
sketch "Skizze51" plane through (0, 5, 0) normal (0, 1, 0) x (1, 0, 0)
  line L0 (-6, -15) -> (-6, 0) projected
  line L1 (-6, -15) -> (-22, -15)
  line L2 (-22, -15) -> (-22, 0)
  line L3 (-22, 0) -> (-6, 0)
  line L4 (-6, 0) -> (-6, -15)
  point P0 (0, 0)
extrude "Extrusion48" add sketch "Skizze51" along normal blind 3.5
sketch "Skizze52" plane through (0, 8.5, 0) normal (0, 1, 0) x (1, 0, 0)
  line L0 (-22, 0) -> (-22, -15) projected
  line L1 (-6, -15) -> (-22, -15) projected
  line L2 (-22, 0) -> (-6, -15)
  line L3 (-14, 0) -> (-6, 0) projected
  line L4 (-6, 0) -> (-22, -15)
  circle A0 centre (-14, -7.5) radius 4.5
  point P0 (0, 0)
  dimension "d191" = 9
extrude "Extrusion49" cut sketch "Skizze52" against normal blind 10 contours A0 L4 L2 | L2 L4 A0 | L4 L2 A0 | L4 A0 L2
sketch "Skizze53" plane through (0, 8.5, 0) normal (0, 1, 0) x (1, 0, 0)
  line L0 (-22, -15) -> (-22, 0) projected
  line L1 (-22, -15) -> (-6, -15)
  line L2 (-6, -15) -> (-6, -17)
  line L3 (-6, -17) -> (-22, -17)
  line L4 (-22, -17) -> (-22, -15)
  point P0 (0, 0)
  dimension "d194" = 16
  dimension "d195" = 2
extrude "Extrusion50" add sketch "Skizze53" against normal blind 8.5
sketch "Skizze55" plane through (0, 8.5, 0) normal (0, 1, 0) x (1, 0, 0)
  line L0 (-11.5057, -13.8835) -> (-16.5057, -13.8835)
  line L1 (-16.5057, -13.8835) -> (-16.5057, -15.1335)
  line L2 (-16.5057, -15.1335) -> (-11.5057, -15.1335)
  line L3 (-11.5057, -15.1335) -> (-11.5057, -13.8835)
  point P0 (0, 0)
  dimension "d204" = 5
  dimension "d205" = 1.25
extrude "Extrusion51" cut sketch "Skizze55" against normal blind 8.5
sketch "Skizze56" plane through (-22, 8.5, 17) normal (0, 0, 1) x (1, 0, 0)
  line L0 (8, 0) -> (16, 0) projected
  line L1 (16, 0) -> (-0.1957, -8.5)
  line L2 (-43.65, -8.5) -> (22, -8.5) projected
  line L3 (0, -3.5) -> (0, 17.5) projected
  line L4 (16, -3.5) -> (16, -8.5) projected
  line L5 (0, 0) -> (16, -8.5)
  circle A0 centre (8, -4.25) radius 1.5
  dimension "d208" = 3
extrude "Extrusion52" cut sketch "Skizze56" against normal blind 6 contours A0 L5 L1 | L1 L5 A0 | L5 A0 L1 | L1 A0 L5
sketch "Skizze57" plane through (0, 8.5, 0) normal (0, 1, 0) x (1, 0, 0)
  line L0 (-22, 0) -> (-22, -17) projected
  line L1 (-22, 0) -> (-6, 0) projected
  line L2 (-22, -17) -> (-6, -17)
  line L3 (-6, -17) -> (-6, 0)
  line L4 (-6, 0) -> (-22, 0)
  line L5 (-22, 0) -> (-22, -17)
  point P0 (0, 0)
extrude "Extrusion53" cut sketch "Skizze57" against normal blind 10
sketch "Skizze58" plane through (0, 5, 0) normal (0, 1, 0) x (1, 0, 0)
  line L0 (-22, 0) -> (-6, 0) projected
  line L1 (-6, 0) -> (7.5, 0)
  line L2 (-6, 0) -> (0, 0) projected
  line L3 (0, 0) -> (7.5, 0)
  line L4 (7.5, 0) -> (7.5, 30)
  line L5 (7.5, 30) -> (0, 30)
  line L6 (0, 30) -> (0, 0)
  dimension "d213" = 13.5
  dimension "d214" = 30
extrude "Extrusion54" add sketch "Skizze58" against normal blind 5
sketch "Skizze59" plane through (0, 5, 0) normal (0, 1, 0) x (1, 0, 0)
  line L0 (-59.65, 0) -> (-73.15, 0)
  line L1 (-59.65, 0) -> (-46.15, 0) construction
  line L2 (-65.65, 30) -> (-65.65, 0) projected
  line L3 (-65.65, 0) -> (-73.15, 0)
  line L4 (-73.15, 0) -> (-73.15, 30)
  line L5 (-73.15, 30) -> (-65.65, 30)
  line L6 (-65.65, 30) -> (-65.65, 0)
  point P0 (0, 0)
  dimension "d217" = 13.5
  dimension "d218" = 180
  dimension "d219" = 30
extrude "Extrusion55" add sketch "Skizze59" against normal blind 5
sketch "Skizze60" plane through (0, 5, 0) normal (0, 1, 0) x (1, 0, 0)
  circle A0 centre (-3, 6) radius 1.5 projected
  circle A1 centre (-3, 6) radius 1.5
  point P0 (0, 0)
  dimension "d222" = 3
extrude "Extrusion56" add sketch "Skizze60" against normal blind 5
sketch "Skizze61" plane through (0, 5, 0) normal (0, 1, 0) x (1, 0, 0)
  circle A0 centre (-3, 23) radius 1.5 projected
  circle A1 centre (-3, 23) radius 1.5
  point P0 (0, 0)
extrude "Extrusion57" add sketch "Skizze61" against normal blind 5
sketch "Skizze62" plane through (0, 5, 0) normal (0, 1, 0) x (1, 0, 0)
  line L0 (7.5, 0) -> (7.5, 30) projected
  line L1 (7.5, 0) -> (1.5, 0)
  line L2 (1.5, 0) -> (1.5, 6)
  line L3 (1.5, 6) -> (7.5, 6)
  line L4 (7.5, 6) -> (7.5, 0)
  circle A0 centre (1.5, 6) radius 1.5
  point P0 (0, 0)
  dimension "d227" = 6
  dimension "d228" = 6
  dimension "d229" = 3
extrude "Extrusion58" cut sketch "Skizze62" against normal blind 5 contours A0 L2 L3 | L3 L2 A0
sketch "Skizze63" plane through (0, 5, 0) normal (0, 1, 0) x (1, 0, 0)
  circle A0 centre (1.5, 6) radius 1.5 projected
  line L0 (1.5, 6) -> (1.5, 23)
  line L1 (7.5, 30) -> (7.5, 0) projected
  line L2 (7.5, 30) -> (1.5, 30)
  line L3 (1.5, 30) -> (1.5, 24)
  line L4 (1.5, 24) -> (7.5, 24)
  line L5 (7.5, 24) -> (7.5, 30)
  circle A1 centre (1.5, 24) radius 1.5
  point P0 (0, 0)
  dimension "d232" = 17
  dimension "d233" = 6
  dimension "d234" = 6
  dimension "d235" = 3
extrude "Extrusion59" cut sketch "Skizze63" against normal blind 5 contours A1 L3 L4 | A1 L4 L3
sketch "Skizze64" plane through (0, 5, 0) normal (0, 1, 0) x (1, 0, 0)
  circle A0 centre (-62.65, 6) radius 1.5 projected
  circle A1 centre (-62.65, 6) radius 1.5
  point P0 (0, 0)
  dimension "d238" = 3
extrude "Extrusion60" add sketch "Skizze64" against normal blind 5
sketch "Skizze65" plane through (0, 5, 0) normal (0, 1, 0) x (1, 0, 0)
  circle A0 centre (-62.65, 23) radius 1.5 projected
  circle A1 centre (-62.65, 23) radius 1.5
  point P0 (0, 0)
  dimension "d241" = 3
extrude "Extrusion61" add sketch "Skizze65" against normal blind 5
sketch "Skizze66" plane through (0, 5, 0) normal (0, 1, 0) x (1, 0, 0)
  line L0 (-73.15, 30) -> (-73.15, 0) projected
  line L1 (-73.15, 0) -> (-67.15, 0)
  line L2 (-67.15, 0) -> (-67.15, 6)
  line L3 (-67.15, 6) -> (-73.15, 6)
  line L4 (-73.15, 6) -> (-73.15, 0)
  circle A0 centre (-67.15, 6) radius 1.5
  point P0 (0, 0)
  dimension "d244" = 6
  dimension "d245" = 6
  dimension "d246" = 3
extrude "Extrusion62" cut sketch "Skizze66" against normal blind 5 contours A0 L2 L3 | L3 L2 A0
sketch "Skizze67" plane through (0, 5, 0) normal (0, 1, 0) x (1, 0, 0)
  line L0 (-73.15, 0) -> (-73.15, 30) projected
  line L1 (-73.15, 30) -> (-67.15, 30)
  line L2 (-67.15, 30) -> (-67.15, 24)
  line L3 (-67.15, 24) -> (-73.15, 24)
  line L4 (-73.15, 24) -> (-73.15, 30)
  circle A0 centre (-67.15, 24) radius 1.5
  point P0 (0, 0)
  dimension "d249" = 6
  dimension "d250" = 6
  dimension "d251" = 3
extrude "Extrusion63" cut sketch "Skizze67" against normal blind 5 contours A0 L2 L3 | L3 L2 A0
sketch "Skizze68" plane through (-6, 5, 0) normal (1, 0, 0) x (0, 0, -1)
  line L0 (17.27, 17) -> (11.77, 17) projected
  line L1 (11.77, 17) -> (11.77, 17.625)
  line L2 (11.77, 17.625) -> (17.27, 17.625)
  line L3 (17.27, 17.625) -> (17.27, 15.125)
  line L4 (17.27, 15.125) -> (11.77, 15.125)
  line L5 (11.77, 15.125) -> (11.77, 17.625)
  point P0 (0, -5)
  dimension "d254" = 0.625
  dimension "d255" = 2.5
extrude "Extrusion64" cut sketch "Skizze68" against normal blind 5 contours L0 L1 L2 L3
sketch "Skizze69" plane through (-6, 5, 0) normal (1, 0, 0) x (0, 0, -1)
  line L0 (11.77, 17) -> (11.77, 15.75) projected
  line L1 (11.77, 15.75) -> (11.77, 15.125)
  line L2 (11.77, 15.75) -> (17.27, 15.75)
  line L3 (17.27, 15.75) -> (17.27, 15.125)
  line L4 (17.27, 15.125) -> (11.77, 15.125)
  line L5 (11.77, 15.125) -> (11.77, 15.75)
  point P0 (0, -5)
  dimension "d258" = 0.625
  dimension "d259" = 5.5
  dimension "d260" = 0.625
extrude "Extrusion65" cut sketch "Skizze69" against normal blind 16
extrude "Extrusion66" add sketch "Skizze68" against normal blind 16 contours L0 L1 L2 L3
sketch "Skizze70" plane through (-6, 5, 0) normal (1, 0, 0) x (0, 0, -1)
  line L0 (11.77, 17) -> (17.27, 17) projected
  line L1 (11.77, 17) -> (17.27, 17)
  line L2 (17.27, 17) -> (17.27, 17.625)
  line L3 (17.27, 17.625) -> (11.77, 17.625)
  line L4 (11.77, 17.625) -> (11.77, 17)
  point P0 (0, -5)
  dimension "d265" = 5.5
  dimension "d266" = 0.625
extrude "Extrusion67" cut sketch "Skizze70" against normal blind 16
sketch "Skizze71" plane through (-59.65, 5, -30) normal (-1, 0, 0) x (0, 0, 1)
  line L0 (17.75, 17) -> (12.25, 17) projected
  line L1 (12.25, 17) -> (17.75, 17)
  line L2 (17.75, 17) -> (17.75, 17.625)
  line L3 (17.75, 17.625) -> (12.25, 17.625)
  line L4 (12.25, 17.625) -> (12.25, 17)
  point P0 (30, -5)
  dimension "d269" = 5.5
  dimension "d270" = 0.625
extrude "Extrusion68" cut sketch "Skizze71" against normal blind 16
sketch "Skizze72" plane through (-59.65, 5, -30) normal (-1, 0, 0) x (0, 0, 1)
  line L0 (12.25, 15.75) -> (12.25, 17.625) projected
  line L1 (12.25, 15.75) -> (17.75, 15.75)
  line L2 (17.75, 15.75) -> (17.75, 15.125)
  line L3 (17.75, 15.125) -> (12.25, 15.125)
  line L4 (12.25, 15.125) -> (12.25, 15.75)
  point P0 (30, -5)
  dimension "d273" = 5.5
  dimension "d274" = 0.625
extrude "Extrusion69" cut sketch "Skizze72" against normal blind 16
sketch "Skizze73" plane through (-6, 5, 0) normal (1, 0, 0) x (0, 0, -1)
  line L0 (11.77, 17.625) -> (11.77, 15.125) projected
  line L1 (12.25, 15.125) -> (17.75, 15.125) projected
  line L2 (11.77, 17.625) -> (17.27, 17.625)
  line L3 (17.27, 17.625) -> (17.27, 15.125)
  line L4 (17.27, 15.125) -> (11.77, 15.125)
  line L5 (11.77, 15.125) -> (11.77, 17.625)
  point P0 (0, -5)
extrude "Extrusion70" add sketch "Skizze73" against normal blind 16
sketch "Skizze74" plane through (0, 26, 0) normal (0, 1, 0) x (1, 0, 0)
  circle A0 centre (-14, 15) radius 1.5 projected
  line L0 (-14, 15) -> (-6, 15)
  line L1 (-6, 0) -> (-6, 30) projected
  point P0 (0, 0)
sketch "Skizze75" plane through (-6, 5, 0) normal (1, 0, 0) x (0, 0, -1)
  line L0 (13.5, 21) -> (16.5, 21) projected
  line L1 (15, 21) -> (15, 17.5)
  line L2 (15, 21) -> (18.5, 21) construction
  line L3 (15, 17.5) -> (17.55, 17.5)
  line L4 (17.55, 17.5) -> (17.55, 15)
  line L5 (17.55, 15) -> (12.45, 15)
  line L6 (12.45, 15) -> (12.45, 17.5)
  line L7 (12.45, 17.5) -> (15, 17.5)
  point P0 (0, -5)
  dimension "d279" = 3.5
  dimension "d280" = 90
  dimension "d281" = 2.55
  dimension "d282" = 2.5
  dimension "d283" = 5.1
  dimension "d284" = 2.5
extrude "Extrusion71" cut sketch "Skizze75" against normal blind 16
sketch "Skizze76" plane through (0, 26, 0) normal (0, 1, 0) x (1, 0, 0)
  circle A0 centre (-14, 15) radius 1.5 projected
  circle A1 centre (-14, 15) radius 1.5
  point P0 (0, 0)
  dimension "d287" = 3
extrude "Extrusion72" add sketch "Skizze76" against normal blind 3.6
extrude "Extrusion73" cut sketch "Skizze74" against normal blind 3.6
sketch "Skizze77" plane through (-59.65, 5, -30) normal (-1, 0, 0) x (0, 0, 1)
  line L0 (12.25, 17.625) -> (12.25, 15.125) projected
  line L1 (17.75, 15.125) -> (12.25, 15.125) projected
  line L2 (12.25, 17.625) -> (17.75, 17.625)
  line L3 (17.75, 17.625) -> (17.75, 15.125)
  line L4 (17.75, 15.125) -> (12.25, 15.125)
  line L5 (12.25, 15.125) -> (12.25, 17.625)
  point P0 (30, -5)
extrude "Extrusion74" add sketch "Skizze77" against normal blind 16
sketch "Skizze78" plane through (0, 26, 0) normal (0, 1, 0) x (1, 0, 0)
  circle A0 centre (-51.65, 15) radius 1.5 projected
  line L0 (-51.65, 15) -> (-59.65, 15)
  line L1 (-59.65, 30) -> (-59.65, 0) projected
  point P0 (0, 0)
sketch "Skizze79" plane through (-59.65, 5, -30) normal (-1, 0, 0) x (0, 0, 1)
  line L0 (0, 21) -> (30, 21) projected
  line L1 (15, 21) -> (15, 17.5)
  line L2 (15, 17.5) -> (17.55, 17.5)
  line L3 (17.55, 17.5) -> (17.55, 15)
  line L4 (17.55, 15) -> (12.45, 15)
  line L5 (12.45, 15) -> (12.45, 17.5)
  line L6 (12.45, 17.5) -> (15, 17.5)
  line L7 (13.5, 17.625) -> (16.5, 17.625) projected
  point P0 (30, -5)
  dimension "d294" = 3.5
  dimension "d295" = 2.55
  dimension "d296" = 2.5
  dimension "d297" = 5.1
extrude "Extrusion75" cut sketch "Skizze79" against normal blind 16
sketch "Skizze80" plane through (0, 26, 0) normal (0, 1, 0) x (1, 0, 0)
  circle A0 centre (-51.65, 15) radius 1.5 projected
  circle A1 centre (-51.65, 15) radius 1.5
  point P0 (0, 0)
  dimension "d300" = 3
extrude "Extrusion76" add sketch "Skizze78" against normal blind 3.6
extrude "Extrusion77" cut sketch "Skizze80" against normal blind 3.6
properties part number "HalterungStangeNeu"
